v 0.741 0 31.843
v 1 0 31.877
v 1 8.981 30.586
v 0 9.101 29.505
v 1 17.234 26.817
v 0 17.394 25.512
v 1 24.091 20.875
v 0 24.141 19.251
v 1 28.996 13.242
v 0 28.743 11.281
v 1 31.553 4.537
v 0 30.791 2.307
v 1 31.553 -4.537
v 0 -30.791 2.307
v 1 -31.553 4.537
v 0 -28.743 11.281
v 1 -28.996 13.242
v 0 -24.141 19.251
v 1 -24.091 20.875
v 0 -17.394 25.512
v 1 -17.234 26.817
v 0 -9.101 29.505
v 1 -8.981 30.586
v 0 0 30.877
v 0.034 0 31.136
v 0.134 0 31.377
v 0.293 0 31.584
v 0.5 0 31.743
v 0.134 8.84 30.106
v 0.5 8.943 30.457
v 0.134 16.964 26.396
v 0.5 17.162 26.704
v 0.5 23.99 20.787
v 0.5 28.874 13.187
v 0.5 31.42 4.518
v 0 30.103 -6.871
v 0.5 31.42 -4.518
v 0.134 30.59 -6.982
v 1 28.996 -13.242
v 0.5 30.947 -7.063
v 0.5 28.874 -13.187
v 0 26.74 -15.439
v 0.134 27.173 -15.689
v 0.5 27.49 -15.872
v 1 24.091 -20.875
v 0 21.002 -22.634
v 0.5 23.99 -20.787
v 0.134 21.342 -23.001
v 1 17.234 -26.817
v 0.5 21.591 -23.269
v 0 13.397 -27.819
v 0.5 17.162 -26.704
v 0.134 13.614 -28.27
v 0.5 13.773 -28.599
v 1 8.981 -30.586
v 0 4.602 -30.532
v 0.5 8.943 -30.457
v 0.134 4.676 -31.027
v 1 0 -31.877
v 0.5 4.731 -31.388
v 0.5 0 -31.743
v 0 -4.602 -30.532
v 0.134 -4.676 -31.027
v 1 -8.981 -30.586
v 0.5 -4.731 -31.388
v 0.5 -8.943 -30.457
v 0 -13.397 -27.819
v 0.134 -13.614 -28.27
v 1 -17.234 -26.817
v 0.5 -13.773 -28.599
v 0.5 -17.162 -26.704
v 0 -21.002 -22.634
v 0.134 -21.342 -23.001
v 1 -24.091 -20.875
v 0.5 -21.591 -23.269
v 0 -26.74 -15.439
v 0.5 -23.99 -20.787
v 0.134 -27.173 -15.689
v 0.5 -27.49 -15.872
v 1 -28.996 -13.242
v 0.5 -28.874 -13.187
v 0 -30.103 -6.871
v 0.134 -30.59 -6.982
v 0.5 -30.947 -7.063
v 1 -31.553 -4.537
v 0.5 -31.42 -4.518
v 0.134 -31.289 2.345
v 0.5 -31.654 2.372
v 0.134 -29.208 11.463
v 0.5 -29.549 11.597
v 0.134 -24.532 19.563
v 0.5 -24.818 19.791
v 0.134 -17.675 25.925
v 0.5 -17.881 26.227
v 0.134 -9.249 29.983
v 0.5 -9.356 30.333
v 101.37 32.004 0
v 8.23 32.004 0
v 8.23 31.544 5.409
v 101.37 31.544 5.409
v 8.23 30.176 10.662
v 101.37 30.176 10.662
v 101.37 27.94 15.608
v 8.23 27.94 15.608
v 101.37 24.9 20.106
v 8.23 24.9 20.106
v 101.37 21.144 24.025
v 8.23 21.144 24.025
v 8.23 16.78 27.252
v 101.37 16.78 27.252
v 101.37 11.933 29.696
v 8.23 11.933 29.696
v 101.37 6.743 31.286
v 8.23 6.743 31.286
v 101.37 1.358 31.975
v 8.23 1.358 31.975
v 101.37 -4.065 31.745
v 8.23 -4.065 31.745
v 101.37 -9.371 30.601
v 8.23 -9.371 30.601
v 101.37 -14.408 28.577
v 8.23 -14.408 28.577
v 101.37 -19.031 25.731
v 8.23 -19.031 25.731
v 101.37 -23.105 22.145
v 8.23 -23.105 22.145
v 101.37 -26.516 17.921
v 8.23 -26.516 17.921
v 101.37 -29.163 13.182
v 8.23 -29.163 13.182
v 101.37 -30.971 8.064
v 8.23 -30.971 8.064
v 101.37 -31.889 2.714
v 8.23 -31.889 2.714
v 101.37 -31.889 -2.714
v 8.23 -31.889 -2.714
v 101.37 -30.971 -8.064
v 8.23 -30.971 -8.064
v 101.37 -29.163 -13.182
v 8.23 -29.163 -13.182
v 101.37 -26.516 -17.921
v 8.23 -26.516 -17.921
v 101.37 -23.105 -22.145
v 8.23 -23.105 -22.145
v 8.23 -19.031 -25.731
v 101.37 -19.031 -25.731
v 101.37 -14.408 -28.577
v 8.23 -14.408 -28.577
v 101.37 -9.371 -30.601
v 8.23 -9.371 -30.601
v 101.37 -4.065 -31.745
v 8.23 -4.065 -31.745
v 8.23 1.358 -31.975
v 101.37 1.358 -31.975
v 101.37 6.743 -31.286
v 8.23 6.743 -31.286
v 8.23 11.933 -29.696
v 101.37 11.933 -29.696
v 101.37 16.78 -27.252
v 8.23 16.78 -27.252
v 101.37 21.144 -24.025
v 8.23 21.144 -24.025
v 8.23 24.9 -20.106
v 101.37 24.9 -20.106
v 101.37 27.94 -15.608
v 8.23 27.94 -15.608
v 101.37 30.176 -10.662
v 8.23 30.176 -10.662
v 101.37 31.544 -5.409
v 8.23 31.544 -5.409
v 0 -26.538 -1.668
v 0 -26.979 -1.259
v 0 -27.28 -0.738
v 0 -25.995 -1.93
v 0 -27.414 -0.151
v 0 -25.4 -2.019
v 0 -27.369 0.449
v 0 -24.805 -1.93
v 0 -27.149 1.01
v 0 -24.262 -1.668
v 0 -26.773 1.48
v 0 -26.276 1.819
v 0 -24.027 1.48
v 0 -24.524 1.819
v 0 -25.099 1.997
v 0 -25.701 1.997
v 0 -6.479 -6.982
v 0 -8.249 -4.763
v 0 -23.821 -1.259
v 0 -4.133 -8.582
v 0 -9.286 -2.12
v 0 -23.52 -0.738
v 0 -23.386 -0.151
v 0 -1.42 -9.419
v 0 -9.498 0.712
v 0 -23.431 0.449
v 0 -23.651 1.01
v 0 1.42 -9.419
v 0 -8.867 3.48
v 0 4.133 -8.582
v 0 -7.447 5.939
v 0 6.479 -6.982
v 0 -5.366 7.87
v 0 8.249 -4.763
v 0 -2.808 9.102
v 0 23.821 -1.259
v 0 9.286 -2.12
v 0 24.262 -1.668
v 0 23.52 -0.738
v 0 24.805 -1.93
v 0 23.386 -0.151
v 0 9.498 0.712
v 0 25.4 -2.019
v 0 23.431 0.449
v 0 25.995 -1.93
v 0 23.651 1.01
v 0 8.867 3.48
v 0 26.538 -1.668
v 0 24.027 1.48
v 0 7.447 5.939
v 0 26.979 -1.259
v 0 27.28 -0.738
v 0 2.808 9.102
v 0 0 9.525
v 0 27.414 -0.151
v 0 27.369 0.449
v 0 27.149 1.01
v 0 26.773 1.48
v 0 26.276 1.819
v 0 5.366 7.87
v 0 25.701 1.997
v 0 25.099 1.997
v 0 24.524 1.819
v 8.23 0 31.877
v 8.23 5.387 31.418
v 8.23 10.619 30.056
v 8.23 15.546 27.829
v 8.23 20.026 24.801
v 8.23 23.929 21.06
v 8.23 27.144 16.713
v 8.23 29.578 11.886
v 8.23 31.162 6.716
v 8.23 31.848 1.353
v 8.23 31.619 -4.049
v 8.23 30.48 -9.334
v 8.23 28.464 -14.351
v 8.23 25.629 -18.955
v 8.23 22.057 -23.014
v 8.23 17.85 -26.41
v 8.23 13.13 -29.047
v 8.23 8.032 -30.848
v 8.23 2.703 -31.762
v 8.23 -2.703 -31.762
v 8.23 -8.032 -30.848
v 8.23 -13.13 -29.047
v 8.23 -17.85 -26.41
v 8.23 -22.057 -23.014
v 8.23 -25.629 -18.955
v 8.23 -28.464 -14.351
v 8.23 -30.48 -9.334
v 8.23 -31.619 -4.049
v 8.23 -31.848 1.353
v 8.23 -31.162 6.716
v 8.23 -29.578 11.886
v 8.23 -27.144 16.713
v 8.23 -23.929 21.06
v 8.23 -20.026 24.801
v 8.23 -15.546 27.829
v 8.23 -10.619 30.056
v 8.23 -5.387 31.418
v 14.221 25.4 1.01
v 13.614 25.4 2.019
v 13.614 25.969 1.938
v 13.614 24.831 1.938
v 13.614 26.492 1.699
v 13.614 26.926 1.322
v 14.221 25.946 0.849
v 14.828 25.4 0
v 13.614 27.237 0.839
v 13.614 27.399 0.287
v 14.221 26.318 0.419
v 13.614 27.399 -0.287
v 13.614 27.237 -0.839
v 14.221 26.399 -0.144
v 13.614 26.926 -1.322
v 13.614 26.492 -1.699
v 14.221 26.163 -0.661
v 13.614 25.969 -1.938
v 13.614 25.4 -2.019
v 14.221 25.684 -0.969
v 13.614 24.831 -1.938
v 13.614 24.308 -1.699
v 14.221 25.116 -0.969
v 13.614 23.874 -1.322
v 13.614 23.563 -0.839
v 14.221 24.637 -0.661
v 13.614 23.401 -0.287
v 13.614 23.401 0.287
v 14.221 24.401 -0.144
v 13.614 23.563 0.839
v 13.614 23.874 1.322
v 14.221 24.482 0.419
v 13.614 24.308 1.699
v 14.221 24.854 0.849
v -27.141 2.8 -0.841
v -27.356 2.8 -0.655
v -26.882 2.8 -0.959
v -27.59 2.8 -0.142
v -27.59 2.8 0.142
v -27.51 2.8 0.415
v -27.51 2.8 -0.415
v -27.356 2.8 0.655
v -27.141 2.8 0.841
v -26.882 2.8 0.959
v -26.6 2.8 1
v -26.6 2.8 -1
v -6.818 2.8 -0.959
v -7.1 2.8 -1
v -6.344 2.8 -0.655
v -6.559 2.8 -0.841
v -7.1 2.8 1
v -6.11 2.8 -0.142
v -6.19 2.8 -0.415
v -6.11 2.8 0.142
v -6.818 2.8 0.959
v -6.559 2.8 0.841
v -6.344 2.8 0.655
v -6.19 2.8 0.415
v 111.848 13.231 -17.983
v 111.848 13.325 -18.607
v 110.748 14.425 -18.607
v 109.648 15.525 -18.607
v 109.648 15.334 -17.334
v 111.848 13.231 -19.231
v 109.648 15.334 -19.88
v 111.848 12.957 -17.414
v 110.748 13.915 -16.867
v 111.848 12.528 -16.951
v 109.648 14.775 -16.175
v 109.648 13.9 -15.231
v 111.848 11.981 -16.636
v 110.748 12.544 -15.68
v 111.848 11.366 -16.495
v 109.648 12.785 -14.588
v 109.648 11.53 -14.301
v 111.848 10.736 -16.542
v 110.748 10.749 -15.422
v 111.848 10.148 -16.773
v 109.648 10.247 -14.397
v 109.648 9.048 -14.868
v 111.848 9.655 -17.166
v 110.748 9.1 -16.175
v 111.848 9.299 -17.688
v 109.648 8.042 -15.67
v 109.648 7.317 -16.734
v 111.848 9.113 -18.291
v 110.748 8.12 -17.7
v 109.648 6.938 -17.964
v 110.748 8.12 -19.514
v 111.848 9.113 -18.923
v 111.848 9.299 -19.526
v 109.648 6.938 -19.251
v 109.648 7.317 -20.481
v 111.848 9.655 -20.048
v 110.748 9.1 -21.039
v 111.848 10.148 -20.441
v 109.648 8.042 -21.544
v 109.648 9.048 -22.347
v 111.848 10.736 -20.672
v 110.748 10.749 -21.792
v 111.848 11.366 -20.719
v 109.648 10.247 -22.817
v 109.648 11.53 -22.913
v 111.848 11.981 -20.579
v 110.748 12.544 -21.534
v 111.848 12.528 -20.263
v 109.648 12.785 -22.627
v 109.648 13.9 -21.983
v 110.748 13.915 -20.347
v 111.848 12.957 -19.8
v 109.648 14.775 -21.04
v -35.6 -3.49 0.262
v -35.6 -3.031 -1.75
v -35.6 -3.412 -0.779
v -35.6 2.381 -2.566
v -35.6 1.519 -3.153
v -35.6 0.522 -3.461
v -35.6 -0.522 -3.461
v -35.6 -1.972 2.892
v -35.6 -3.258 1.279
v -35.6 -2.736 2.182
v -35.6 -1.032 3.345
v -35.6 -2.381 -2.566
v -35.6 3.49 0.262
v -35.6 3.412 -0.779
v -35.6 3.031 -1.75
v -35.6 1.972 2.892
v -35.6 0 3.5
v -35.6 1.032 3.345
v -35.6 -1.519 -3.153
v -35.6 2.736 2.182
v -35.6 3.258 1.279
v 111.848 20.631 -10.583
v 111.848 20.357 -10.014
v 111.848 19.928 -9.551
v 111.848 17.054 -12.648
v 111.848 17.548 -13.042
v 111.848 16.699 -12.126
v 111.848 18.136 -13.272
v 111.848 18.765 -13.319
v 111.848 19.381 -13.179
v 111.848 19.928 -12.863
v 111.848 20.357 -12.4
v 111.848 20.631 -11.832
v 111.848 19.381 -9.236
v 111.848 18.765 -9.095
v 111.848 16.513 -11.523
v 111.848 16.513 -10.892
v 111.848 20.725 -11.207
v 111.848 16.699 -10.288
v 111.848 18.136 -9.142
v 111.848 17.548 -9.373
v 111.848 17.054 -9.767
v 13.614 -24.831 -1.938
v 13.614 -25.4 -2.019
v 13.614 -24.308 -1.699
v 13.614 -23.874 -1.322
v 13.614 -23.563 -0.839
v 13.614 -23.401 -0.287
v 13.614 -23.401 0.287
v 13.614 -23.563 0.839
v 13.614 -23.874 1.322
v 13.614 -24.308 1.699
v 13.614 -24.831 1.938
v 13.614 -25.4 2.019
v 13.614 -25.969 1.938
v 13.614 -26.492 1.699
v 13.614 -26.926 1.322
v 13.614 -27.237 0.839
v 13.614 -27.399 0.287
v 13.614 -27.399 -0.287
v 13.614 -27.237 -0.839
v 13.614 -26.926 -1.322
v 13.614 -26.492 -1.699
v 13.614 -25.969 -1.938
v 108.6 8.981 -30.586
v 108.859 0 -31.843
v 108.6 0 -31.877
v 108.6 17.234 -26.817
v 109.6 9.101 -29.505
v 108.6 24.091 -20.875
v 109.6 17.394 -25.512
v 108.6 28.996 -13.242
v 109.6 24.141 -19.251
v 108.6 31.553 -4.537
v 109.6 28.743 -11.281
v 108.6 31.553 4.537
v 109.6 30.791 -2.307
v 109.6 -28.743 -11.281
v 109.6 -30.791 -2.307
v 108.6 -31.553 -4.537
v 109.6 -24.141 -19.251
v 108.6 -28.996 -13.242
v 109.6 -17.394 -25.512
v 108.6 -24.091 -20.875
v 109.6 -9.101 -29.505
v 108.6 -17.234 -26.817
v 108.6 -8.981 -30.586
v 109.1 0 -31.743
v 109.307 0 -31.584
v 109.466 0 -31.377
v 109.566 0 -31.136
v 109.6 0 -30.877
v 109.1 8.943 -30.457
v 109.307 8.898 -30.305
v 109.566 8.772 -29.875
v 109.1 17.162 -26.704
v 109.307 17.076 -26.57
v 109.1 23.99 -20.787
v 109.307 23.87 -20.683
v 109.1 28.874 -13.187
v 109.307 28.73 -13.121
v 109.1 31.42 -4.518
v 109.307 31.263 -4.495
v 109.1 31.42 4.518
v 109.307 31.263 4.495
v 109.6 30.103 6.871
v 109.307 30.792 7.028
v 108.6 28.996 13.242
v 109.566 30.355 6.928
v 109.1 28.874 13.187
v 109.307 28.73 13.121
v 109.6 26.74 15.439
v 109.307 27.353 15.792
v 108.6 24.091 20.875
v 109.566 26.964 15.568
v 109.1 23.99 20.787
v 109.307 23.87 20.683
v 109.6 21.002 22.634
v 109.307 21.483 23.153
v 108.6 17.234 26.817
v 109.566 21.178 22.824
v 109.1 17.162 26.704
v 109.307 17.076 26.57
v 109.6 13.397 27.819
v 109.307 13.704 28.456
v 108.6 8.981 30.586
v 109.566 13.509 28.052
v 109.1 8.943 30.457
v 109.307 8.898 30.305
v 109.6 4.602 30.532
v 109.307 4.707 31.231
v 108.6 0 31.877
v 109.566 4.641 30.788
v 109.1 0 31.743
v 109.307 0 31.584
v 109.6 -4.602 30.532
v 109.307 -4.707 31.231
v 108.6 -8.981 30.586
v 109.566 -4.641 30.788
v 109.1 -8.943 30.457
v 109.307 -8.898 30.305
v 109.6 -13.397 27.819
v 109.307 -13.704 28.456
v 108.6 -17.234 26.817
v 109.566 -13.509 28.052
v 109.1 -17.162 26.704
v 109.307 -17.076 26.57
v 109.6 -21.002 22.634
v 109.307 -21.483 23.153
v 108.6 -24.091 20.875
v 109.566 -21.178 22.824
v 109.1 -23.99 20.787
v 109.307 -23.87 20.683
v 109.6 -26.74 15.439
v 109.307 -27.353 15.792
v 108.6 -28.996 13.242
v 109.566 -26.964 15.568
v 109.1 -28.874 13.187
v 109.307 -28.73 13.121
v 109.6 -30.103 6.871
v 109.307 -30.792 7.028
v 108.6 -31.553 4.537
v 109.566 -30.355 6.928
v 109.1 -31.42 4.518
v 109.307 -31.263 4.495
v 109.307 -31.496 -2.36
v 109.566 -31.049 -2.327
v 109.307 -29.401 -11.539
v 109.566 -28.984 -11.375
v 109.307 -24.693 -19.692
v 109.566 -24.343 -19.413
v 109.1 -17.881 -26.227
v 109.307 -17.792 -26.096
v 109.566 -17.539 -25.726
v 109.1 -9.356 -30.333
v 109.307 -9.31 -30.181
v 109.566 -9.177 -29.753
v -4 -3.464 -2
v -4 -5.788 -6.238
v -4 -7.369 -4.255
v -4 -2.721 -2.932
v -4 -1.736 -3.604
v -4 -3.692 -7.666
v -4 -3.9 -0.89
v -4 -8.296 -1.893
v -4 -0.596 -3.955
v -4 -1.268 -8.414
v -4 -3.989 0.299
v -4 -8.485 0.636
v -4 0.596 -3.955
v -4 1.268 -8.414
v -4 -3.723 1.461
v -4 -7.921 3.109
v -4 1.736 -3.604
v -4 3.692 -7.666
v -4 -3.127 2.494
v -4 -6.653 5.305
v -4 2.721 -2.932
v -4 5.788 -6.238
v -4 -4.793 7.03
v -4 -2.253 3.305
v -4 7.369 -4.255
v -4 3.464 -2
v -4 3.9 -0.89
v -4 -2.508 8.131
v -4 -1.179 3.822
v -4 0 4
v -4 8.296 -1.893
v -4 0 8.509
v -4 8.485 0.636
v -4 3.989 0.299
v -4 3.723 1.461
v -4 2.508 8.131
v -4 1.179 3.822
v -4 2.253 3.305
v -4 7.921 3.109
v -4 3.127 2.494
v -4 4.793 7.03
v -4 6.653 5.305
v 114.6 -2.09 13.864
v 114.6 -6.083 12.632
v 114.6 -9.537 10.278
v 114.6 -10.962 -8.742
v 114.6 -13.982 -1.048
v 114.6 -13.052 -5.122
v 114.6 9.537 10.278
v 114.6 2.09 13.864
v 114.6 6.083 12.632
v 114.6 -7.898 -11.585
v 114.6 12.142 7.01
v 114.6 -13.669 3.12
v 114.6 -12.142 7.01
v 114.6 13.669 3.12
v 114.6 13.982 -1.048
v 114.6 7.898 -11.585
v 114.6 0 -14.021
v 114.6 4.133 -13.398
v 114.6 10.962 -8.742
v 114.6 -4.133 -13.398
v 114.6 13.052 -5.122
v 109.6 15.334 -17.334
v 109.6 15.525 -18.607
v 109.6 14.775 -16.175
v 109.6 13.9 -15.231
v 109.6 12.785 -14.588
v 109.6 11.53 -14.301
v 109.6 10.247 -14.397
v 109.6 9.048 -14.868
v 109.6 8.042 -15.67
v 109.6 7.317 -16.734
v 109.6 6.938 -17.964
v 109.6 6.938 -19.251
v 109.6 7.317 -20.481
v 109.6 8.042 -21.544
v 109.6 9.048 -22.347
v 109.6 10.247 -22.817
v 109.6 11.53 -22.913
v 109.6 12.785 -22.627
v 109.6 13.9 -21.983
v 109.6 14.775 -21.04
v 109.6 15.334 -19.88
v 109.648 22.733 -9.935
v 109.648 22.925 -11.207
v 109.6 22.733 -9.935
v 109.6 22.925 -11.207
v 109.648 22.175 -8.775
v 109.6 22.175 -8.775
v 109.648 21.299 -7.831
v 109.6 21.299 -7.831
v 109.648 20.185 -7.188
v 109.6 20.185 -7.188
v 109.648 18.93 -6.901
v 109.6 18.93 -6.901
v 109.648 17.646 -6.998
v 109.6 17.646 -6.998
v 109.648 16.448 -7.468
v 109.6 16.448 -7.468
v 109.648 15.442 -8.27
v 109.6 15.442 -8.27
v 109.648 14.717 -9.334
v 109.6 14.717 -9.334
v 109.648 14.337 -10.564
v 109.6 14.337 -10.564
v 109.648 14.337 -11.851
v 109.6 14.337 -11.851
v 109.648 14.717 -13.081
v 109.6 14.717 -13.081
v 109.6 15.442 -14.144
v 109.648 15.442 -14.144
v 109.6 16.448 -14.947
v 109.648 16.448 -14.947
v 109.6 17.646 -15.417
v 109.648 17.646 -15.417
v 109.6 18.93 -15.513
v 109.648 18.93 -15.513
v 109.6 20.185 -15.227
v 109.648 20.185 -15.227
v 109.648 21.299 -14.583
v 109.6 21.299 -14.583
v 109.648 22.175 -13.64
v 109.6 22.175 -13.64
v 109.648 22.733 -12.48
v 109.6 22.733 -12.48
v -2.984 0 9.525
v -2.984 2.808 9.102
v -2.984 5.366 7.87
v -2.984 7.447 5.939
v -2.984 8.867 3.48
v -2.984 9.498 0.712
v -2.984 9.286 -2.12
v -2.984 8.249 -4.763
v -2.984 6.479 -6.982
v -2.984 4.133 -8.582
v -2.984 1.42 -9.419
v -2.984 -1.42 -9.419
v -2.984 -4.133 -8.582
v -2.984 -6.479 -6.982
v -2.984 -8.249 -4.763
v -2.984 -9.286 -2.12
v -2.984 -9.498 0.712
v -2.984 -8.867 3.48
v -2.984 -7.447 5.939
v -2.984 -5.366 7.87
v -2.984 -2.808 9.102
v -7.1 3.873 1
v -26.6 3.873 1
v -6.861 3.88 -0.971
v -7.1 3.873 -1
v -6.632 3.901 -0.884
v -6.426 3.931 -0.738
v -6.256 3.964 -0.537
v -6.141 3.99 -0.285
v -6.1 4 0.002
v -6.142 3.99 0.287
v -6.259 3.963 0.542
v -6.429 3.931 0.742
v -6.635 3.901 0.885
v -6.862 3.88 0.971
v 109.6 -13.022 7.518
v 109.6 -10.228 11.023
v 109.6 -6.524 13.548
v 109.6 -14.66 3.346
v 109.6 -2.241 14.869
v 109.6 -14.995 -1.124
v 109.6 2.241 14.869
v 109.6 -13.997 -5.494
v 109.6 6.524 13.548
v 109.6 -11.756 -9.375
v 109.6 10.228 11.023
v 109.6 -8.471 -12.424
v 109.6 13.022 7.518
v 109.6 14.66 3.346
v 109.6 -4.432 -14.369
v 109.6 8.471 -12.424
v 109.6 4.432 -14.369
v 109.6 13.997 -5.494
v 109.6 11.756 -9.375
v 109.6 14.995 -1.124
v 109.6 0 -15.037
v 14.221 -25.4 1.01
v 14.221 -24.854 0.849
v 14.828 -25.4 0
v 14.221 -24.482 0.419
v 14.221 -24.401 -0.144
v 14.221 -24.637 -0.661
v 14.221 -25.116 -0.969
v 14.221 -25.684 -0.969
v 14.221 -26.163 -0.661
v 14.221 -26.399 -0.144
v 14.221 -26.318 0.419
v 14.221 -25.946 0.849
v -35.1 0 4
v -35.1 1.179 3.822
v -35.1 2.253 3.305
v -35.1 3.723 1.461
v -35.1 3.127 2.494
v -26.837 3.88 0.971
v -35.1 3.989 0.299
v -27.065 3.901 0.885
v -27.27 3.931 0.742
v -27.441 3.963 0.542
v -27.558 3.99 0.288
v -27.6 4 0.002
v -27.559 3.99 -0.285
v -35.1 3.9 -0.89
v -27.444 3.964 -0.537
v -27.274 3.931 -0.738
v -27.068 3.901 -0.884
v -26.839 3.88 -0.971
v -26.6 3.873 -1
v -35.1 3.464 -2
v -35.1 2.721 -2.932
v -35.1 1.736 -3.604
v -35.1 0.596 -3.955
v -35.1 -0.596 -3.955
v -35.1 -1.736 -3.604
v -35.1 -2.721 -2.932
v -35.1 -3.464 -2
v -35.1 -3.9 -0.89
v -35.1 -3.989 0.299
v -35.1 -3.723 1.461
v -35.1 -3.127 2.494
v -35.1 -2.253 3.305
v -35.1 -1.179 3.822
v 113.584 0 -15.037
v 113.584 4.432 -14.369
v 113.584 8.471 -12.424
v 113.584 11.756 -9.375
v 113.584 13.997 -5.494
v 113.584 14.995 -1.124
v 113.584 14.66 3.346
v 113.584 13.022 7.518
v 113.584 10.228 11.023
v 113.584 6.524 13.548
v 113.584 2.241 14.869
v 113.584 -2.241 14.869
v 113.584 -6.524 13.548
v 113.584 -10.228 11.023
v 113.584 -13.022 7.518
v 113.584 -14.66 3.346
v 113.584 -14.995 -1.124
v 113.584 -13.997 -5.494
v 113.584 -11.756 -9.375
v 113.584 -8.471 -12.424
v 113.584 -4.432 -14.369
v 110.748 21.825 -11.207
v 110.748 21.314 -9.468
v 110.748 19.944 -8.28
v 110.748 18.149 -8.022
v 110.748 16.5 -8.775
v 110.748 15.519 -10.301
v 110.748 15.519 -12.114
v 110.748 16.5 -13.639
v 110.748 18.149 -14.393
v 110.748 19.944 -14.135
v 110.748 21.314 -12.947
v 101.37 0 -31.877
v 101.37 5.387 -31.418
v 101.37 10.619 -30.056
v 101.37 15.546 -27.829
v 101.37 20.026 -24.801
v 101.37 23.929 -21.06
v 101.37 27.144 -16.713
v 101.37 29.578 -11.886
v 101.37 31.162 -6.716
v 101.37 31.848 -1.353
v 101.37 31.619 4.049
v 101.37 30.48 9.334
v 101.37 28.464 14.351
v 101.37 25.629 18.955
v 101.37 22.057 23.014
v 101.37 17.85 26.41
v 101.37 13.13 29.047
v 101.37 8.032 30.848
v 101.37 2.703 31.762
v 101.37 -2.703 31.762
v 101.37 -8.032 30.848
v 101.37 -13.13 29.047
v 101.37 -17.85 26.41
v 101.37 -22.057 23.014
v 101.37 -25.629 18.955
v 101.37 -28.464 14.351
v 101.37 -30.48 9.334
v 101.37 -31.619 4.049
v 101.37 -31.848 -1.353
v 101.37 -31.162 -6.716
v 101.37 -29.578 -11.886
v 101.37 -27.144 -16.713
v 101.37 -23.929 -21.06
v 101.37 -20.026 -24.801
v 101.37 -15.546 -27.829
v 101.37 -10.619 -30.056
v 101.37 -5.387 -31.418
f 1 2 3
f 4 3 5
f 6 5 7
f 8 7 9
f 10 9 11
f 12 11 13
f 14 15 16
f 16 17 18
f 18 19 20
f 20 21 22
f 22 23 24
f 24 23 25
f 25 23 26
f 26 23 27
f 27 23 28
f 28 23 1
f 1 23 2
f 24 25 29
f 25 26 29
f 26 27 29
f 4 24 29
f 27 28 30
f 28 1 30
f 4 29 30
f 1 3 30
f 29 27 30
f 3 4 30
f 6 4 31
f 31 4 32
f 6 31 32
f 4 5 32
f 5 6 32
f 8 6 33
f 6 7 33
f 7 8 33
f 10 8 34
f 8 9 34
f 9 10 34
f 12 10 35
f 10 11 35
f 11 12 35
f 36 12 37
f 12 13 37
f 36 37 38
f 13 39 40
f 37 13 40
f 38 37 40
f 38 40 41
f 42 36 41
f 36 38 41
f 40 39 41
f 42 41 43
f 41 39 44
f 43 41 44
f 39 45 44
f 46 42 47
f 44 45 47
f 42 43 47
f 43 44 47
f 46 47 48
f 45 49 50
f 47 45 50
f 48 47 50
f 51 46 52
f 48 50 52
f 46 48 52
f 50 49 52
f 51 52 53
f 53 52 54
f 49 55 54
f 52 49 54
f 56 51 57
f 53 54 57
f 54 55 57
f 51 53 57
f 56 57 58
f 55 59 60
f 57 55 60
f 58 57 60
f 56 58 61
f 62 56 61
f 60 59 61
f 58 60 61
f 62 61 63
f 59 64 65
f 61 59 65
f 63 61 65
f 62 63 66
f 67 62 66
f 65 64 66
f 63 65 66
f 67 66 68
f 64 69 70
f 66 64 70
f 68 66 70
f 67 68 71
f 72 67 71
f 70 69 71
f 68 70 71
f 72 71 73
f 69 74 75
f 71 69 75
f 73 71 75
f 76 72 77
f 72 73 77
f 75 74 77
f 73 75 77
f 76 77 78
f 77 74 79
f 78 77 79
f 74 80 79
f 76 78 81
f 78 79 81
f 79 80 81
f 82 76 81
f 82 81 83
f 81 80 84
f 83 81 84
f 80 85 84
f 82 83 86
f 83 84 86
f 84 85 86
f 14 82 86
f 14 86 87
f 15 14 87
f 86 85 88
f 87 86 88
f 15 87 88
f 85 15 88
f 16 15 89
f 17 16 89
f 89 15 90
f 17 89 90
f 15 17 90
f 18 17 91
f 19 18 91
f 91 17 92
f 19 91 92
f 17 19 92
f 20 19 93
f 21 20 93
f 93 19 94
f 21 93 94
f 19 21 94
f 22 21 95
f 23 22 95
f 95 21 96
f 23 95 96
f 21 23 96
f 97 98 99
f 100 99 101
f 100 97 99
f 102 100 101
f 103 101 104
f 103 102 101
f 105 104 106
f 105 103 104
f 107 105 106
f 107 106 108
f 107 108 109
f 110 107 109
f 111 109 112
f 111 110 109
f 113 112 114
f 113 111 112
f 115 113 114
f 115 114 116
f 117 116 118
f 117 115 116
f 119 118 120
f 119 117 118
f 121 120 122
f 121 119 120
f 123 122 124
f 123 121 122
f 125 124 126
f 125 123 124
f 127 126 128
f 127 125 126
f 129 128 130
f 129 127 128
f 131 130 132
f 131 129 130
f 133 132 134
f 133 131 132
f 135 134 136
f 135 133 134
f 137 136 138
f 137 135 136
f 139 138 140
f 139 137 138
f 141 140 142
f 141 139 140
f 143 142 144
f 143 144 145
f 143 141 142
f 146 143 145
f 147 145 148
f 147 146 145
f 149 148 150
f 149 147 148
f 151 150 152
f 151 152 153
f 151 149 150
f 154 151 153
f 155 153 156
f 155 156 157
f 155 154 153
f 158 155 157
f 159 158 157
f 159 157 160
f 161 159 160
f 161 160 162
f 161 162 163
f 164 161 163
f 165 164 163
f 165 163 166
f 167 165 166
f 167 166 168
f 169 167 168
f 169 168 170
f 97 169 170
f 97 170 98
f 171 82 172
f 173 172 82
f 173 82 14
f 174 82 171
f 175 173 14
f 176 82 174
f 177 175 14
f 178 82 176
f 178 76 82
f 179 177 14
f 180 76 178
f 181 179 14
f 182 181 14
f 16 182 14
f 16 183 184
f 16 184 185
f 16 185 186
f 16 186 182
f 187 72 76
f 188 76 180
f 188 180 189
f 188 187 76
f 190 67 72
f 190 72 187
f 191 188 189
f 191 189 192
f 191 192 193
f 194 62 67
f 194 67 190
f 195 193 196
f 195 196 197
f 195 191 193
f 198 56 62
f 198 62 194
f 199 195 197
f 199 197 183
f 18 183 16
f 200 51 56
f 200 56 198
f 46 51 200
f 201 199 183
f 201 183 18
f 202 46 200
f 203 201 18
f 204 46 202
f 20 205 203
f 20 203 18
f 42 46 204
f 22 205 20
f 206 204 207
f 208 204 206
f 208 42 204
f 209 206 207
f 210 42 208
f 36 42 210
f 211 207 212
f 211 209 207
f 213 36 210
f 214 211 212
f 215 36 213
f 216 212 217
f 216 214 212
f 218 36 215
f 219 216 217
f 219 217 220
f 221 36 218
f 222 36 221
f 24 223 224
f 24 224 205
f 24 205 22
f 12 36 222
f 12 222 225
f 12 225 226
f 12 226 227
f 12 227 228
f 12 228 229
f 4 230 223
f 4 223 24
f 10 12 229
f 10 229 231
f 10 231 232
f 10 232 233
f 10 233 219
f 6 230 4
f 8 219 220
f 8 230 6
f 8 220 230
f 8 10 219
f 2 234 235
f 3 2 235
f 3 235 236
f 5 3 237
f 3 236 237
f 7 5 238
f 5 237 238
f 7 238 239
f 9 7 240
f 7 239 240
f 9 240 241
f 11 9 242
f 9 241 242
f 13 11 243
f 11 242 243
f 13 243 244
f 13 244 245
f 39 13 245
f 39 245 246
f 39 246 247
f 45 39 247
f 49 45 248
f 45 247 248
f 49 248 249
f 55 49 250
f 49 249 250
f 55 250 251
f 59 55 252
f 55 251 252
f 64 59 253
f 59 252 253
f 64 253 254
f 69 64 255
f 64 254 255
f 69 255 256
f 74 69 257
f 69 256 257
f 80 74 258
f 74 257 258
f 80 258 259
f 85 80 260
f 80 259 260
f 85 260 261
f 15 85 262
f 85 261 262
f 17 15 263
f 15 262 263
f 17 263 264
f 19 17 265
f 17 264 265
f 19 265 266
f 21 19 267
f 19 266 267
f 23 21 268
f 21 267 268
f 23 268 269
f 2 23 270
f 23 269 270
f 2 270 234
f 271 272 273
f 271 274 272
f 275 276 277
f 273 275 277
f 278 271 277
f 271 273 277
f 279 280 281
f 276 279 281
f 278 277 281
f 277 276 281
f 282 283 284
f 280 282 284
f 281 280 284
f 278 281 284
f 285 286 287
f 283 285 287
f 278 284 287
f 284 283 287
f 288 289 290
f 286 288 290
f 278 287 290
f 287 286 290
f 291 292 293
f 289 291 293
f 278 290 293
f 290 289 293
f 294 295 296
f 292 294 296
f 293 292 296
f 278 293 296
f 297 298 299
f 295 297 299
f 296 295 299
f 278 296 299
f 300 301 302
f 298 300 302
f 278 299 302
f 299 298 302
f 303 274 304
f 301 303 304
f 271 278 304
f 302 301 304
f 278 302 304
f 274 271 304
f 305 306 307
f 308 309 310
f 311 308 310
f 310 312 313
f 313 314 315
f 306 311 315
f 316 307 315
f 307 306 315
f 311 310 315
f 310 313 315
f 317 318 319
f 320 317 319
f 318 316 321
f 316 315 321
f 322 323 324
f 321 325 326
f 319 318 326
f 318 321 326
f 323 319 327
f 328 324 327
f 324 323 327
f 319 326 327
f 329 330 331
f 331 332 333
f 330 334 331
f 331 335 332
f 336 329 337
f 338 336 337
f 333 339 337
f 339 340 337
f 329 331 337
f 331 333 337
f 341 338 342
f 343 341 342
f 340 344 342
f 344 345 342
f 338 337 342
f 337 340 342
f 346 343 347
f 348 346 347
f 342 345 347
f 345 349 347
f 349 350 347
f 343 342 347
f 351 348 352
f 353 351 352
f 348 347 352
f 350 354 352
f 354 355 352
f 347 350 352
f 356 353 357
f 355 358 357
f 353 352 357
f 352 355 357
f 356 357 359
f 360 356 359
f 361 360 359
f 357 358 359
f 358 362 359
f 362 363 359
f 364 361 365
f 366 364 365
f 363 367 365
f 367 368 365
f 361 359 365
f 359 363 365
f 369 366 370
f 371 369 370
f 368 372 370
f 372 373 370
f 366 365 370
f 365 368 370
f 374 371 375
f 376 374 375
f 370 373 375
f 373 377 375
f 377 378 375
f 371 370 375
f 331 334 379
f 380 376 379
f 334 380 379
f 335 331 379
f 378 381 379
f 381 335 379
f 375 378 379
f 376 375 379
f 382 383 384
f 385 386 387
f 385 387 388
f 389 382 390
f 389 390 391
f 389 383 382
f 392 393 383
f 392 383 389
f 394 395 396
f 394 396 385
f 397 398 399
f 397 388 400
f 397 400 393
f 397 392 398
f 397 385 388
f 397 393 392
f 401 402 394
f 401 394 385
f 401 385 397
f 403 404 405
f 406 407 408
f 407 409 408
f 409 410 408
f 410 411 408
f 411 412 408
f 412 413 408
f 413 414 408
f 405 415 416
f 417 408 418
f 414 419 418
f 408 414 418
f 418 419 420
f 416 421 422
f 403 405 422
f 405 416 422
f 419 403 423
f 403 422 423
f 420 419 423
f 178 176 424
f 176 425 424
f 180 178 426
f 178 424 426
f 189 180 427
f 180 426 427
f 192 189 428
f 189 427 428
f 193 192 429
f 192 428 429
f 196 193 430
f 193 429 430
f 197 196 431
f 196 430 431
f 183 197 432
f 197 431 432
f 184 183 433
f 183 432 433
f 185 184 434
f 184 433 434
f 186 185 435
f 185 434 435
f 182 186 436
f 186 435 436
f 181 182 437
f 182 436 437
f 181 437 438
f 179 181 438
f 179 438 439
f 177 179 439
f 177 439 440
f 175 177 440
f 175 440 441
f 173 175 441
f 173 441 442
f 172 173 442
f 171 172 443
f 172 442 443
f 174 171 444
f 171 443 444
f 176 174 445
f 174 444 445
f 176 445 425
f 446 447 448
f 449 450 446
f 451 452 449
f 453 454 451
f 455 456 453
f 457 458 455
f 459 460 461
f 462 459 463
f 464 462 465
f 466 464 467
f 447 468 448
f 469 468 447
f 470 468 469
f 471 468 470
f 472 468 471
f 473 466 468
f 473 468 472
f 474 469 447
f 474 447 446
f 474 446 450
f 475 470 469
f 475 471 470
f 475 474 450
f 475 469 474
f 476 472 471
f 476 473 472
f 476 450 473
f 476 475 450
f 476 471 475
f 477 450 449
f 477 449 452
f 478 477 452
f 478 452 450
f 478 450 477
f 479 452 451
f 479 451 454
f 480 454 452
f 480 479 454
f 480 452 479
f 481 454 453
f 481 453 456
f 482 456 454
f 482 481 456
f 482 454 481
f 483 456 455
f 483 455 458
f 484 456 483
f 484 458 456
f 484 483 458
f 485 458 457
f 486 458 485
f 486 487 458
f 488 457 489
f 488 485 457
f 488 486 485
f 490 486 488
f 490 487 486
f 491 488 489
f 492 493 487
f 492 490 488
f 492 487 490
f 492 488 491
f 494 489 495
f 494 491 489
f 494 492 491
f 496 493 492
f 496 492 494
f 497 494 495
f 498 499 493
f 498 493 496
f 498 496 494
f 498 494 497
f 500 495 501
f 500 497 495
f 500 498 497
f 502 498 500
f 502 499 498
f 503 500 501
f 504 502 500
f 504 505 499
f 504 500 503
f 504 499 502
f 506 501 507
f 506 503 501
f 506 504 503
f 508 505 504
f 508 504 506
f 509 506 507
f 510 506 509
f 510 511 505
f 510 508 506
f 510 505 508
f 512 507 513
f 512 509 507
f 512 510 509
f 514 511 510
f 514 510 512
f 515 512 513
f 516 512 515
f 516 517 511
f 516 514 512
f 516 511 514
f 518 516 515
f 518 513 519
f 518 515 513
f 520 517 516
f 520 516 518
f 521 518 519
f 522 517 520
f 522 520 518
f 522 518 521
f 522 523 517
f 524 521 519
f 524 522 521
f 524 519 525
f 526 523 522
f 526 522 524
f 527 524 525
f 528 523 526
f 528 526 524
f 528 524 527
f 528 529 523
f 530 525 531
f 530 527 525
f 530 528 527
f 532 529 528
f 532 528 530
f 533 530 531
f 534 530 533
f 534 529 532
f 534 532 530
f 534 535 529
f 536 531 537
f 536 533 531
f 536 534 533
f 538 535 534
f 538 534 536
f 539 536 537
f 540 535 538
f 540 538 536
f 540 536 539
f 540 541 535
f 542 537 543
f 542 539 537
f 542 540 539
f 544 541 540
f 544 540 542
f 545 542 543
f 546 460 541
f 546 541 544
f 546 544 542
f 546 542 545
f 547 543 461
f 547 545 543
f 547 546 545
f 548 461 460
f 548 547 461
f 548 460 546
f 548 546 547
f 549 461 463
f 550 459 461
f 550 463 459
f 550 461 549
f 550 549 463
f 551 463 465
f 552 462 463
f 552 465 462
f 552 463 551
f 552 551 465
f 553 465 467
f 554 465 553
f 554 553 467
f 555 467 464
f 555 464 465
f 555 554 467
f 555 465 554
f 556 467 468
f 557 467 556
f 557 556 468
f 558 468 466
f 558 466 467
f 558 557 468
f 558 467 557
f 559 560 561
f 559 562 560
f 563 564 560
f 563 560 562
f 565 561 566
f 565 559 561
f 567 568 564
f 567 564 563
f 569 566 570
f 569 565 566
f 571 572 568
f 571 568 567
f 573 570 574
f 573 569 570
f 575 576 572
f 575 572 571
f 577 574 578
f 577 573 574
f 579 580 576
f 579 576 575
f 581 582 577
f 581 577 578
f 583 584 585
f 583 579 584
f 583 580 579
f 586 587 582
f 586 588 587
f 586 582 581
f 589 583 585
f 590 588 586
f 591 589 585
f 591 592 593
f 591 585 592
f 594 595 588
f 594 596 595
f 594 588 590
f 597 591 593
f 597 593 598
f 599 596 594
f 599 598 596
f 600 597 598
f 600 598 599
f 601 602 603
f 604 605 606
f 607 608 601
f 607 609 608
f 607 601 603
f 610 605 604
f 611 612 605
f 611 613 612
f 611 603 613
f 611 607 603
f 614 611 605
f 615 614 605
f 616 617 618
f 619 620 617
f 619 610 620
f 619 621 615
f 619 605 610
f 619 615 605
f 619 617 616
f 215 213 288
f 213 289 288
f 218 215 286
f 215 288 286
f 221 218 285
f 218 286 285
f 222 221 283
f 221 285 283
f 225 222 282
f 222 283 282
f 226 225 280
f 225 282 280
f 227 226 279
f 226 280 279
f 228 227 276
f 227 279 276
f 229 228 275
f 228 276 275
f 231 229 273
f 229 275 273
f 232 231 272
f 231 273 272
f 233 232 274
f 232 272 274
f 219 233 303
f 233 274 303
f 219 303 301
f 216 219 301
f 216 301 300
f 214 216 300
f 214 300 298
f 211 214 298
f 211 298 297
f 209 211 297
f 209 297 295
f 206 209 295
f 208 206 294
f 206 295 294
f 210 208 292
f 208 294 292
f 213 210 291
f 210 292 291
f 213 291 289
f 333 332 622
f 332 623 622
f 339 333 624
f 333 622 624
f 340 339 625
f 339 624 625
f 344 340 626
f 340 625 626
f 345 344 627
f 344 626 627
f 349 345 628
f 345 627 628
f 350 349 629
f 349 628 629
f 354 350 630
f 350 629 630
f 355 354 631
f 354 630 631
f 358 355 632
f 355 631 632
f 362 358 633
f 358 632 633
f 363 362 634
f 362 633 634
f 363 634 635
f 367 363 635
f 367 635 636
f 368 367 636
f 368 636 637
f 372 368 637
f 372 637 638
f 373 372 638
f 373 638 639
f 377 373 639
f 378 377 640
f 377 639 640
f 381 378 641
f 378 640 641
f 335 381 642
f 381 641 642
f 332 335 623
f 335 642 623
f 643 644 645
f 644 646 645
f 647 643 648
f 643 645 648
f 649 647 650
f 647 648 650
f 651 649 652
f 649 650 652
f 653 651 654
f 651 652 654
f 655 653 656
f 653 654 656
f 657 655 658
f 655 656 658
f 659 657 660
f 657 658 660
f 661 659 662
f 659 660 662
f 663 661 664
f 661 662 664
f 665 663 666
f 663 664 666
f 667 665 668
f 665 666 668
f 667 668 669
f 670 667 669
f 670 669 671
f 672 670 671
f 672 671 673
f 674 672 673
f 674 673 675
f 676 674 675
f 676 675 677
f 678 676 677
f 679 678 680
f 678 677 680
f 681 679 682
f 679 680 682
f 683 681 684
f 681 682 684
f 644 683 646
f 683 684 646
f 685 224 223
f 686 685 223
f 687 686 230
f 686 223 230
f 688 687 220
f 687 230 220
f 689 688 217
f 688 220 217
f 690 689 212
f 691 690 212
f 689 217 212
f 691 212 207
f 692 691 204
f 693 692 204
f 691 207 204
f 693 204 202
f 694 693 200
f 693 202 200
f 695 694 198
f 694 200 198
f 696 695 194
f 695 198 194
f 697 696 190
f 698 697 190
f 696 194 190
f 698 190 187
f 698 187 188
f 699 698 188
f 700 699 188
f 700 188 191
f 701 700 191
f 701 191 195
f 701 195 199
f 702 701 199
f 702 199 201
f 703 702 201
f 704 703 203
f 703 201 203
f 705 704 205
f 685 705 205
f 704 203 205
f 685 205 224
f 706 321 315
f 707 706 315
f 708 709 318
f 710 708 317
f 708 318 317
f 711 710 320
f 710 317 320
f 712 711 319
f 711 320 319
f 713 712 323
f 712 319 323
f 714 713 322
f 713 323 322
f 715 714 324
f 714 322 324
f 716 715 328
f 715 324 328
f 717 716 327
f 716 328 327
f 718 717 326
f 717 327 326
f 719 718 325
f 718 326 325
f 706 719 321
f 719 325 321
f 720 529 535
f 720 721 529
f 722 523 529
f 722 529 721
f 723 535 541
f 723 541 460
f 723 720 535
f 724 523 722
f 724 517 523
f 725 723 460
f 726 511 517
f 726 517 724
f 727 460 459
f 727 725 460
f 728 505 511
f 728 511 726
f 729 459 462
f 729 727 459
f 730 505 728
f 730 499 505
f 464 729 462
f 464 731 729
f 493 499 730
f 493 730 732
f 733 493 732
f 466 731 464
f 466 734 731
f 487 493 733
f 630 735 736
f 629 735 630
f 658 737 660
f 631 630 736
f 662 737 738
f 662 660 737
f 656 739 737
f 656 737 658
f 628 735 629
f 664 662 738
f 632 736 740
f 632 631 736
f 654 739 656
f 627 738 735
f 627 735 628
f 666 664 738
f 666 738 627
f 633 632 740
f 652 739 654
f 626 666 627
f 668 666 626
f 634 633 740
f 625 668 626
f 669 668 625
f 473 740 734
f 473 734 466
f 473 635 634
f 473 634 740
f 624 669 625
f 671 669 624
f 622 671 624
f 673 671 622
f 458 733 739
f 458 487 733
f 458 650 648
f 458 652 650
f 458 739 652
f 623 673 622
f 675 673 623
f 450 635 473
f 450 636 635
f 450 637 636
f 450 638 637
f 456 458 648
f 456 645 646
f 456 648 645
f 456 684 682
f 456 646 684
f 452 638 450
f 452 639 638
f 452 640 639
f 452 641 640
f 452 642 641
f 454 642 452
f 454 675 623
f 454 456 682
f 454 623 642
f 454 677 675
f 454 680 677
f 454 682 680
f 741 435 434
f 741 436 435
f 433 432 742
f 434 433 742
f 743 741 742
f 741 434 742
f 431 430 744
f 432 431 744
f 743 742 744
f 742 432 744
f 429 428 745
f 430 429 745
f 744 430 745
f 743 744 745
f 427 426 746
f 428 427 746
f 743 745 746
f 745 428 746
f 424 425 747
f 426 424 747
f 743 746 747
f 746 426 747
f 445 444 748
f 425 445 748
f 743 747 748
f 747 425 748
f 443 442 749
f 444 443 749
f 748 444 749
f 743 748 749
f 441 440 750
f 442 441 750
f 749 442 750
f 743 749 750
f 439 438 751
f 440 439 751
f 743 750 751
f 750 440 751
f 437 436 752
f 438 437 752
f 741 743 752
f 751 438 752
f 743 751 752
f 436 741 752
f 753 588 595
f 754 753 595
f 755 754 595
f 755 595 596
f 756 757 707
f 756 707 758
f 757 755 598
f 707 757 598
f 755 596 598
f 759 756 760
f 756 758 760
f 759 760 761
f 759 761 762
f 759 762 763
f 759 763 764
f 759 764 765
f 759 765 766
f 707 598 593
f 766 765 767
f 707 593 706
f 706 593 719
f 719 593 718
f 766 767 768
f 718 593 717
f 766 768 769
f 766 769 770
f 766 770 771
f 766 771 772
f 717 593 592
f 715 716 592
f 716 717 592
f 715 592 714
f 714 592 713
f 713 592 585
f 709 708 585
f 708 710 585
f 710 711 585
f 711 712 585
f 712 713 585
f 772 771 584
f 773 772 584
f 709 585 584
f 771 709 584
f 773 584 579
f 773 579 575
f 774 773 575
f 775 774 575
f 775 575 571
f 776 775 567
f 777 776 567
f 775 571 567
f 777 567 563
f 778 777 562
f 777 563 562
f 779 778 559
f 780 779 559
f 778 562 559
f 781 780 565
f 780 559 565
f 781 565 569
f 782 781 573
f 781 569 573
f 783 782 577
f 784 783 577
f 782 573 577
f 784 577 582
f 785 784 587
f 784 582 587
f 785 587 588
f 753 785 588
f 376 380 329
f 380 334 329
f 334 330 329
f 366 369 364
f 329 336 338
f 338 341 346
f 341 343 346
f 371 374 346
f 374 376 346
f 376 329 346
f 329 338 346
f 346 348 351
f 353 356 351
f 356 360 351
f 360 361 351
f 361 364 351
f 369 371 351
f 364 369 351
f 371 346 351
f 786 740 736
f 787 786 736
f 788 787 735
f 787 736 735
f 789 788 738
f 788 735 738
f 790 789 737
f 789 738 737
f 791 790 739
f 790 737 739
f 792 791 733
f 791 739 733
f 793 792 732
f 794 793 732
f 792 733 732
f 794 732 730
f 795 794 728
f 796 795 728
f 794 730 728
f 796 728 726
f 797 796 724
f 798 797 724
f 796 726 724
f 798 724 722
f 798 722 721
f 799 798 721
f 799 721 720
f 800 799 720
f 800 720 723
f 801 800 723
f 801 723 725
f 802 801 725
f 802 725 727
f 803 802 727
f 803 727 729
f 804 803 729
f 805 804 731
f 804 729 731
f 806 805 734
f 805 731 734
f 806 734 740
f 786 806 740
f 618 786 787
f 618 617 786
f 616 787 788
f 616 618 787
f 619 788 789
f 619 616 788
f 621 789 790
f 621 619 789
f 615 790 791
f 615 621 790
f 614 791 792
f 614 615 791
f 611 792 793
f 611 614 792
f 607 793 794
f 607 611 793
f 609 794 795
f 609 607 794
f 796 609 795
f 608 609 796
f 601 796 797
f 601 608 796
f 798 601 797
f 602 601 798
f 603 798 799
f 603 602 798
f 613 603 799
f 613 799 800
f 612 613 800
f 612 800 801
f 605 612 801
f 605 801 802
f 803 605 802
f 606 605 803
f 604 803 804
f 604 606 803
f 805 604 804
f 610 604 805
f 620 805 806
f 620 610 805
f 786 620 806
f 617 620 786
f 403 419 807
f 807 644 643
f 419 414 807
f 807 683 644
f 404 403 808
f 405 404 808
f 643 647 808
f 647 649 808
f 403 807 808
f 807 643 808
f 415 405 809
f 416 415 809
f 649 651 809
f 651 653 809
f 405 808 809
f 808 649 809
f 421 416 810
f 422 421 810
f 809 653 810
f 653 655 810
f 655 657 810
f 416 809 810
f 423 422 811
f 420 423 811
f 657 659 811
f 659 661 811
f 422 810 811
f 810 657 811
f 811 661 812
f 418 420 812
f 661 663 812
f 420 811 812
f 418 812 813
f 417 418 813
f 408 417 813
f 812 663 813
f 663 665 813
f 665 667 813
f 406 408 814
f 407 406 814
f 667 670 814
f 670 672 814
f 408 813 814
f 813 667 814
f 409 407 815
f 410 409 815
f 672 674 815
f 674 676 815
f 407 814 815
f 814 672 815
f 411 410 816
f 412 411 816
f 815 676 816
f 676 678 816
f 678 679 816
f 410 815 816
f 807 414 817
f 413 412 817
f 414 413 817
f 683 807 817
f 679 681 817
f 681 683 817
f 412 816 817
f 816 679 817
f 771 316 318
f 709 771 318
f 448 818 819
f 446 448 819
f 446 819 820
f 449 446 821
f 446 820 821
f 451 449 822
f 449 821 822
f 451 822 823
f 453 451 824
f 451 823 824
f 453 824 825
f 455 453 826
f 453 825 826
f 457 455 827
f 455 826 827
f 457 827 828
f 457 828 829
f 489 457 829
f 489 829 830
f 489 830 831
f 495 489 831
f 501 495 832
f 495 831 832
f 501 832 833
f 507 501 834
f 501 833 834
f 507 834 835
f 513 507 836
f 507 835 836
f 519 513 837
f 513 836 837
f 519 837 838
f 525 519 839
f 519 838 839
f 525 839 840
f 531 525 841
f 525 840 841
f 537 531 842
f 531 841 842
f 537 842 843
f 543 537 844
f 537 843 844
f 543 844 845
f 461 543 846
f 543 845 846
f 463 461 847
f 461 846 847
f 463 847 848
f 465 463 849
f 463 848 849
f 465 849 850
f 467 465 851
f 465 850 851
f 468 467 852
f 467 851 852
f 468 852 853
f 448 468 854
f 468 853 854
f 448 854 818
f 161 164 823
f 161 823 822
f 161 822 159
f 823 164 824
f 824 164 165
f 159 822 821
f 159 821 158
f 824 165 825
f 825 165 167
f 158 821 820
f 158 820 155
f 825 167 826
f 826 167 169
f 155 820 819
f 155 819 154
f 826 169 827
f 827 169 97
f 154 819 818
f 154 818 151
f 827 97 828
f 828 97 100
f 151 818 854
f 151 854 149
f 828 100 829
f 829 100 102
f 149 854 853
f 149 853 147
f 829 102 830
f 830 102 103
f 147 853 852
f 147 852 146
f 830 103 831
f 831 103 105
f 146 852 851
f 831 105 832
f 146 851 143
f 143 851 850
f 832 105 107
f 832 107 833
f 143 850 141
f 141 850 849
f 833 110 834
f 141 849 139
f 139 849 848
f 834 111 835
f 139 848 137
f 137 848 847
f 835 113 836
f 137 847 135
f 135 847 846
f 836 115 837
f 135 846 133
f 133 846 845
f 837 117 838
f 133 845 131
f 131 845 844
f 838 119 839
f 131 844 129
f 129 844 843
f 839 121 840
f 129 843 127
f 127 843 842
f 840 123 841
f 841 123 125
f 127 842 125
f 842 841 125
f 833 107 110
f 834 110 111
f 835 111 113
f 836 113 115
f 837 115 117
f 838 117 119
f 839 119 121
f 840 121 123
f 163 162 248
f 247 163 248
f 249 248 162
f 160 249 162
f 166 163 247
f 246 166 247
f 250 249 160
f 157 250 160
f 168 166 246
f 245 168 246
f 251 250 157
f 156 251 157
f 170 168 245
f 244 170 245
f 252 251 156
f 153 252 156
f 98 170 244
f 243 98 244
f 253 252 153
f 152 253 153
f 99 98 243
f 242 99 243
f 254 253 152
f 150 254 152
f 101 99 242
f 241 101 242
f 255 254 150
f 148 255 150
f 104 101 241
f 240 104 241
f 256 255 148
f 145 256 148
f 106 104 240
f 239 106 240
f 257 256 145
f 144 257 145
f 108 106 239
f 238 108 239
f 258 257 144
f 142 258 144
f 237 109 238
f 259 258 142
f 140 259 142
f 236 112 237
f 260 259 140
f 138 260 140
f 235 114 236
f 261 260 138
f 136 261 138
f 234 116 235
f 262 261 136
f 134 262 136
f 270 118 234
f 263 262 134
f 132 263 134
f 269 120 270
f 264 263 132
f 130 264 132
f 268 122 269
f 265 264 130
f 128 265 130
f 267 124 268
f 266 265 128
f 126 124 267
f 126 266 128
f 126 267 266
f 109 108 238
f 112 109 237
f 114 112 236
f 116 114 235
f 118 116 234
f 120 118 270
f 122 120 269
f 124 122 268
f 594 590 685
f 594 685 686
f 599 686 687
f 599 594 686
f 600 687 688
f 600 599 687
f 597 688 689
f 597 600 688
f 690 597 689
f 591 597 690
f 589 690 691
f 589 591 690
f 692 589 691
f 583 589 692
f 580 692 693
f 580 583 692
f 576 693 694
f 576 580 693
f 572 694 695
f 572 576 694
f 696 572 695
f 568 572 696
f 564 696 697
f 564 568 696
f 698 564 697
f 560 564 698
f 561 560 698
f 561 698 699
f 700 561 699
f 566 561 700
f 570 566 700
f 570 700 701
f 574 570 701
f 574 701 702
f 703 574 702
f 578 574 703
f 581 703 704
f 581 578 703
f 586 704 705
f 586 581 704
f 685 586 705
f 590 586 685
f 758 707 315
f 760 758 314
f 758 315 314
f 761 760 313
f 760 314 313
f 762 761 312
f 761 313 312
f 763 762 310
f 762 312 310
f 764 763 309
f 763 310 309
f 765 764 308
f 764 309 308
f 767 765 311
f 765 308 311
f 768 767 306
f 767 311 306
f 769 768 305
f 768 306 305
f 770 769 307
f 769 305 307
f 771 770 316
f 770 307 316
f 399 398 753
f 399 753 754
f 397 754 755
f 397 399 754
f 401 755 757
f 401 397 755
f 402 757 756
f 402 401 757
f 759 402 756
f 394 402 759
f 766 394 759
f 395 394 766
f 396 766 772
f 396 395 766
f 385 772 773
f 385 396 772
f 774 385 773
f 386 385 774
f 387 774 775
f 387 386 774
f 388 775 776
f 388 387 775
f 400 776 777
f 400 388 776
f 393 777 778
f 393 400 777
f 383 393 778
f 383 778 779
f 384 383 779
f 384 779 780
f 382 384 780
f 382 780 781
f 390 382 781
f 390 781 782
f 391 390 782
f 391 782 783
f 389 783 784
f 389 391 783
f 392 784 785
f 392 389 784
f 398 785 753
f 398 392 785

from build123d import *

# Parameters (mm, degrees)
SKETCH1_W                       = 93.1408
SKETCH1_H                       = 32.004
SKETCH2_R                       = 31.877
BOSS_EXTRUDE1_DEPTH             = 8.2296
SKETCH3_R                       = 15.0368
BOSS_EXTRUDE2_DEPTH             = 3.984
SKETCH4_R                       = 15.0368
BOSS_EXTRUDE3_DEPTH             = 1.016
BOSS_EXTRUDE3_TAPER             = 45
SKETCH5_R                       = 31.877
BOSS_EXTRUDE4_DEPTH             = 8.2296
SKETCH6_R                       = 9.525
BOSS_EXTRUDE5_DEPTH             = 4
SKETCH7_R                       = 4
BOSS_EXTRUDE6_DEPTH             = 31.6
CUT_EXTRUDE1_REACH              = 31.204
F_21_0_159_DIAMETER_HOLE1_D     = 4.0386
F_21_0_159_DIAMETER_HOLE1_DEPTH = 13.6144
F_21_0_159_DIAMETER_HOLE1_TIP   = 1.213317848
CHAMFER1_SIZE                   = 1.016
CHAMFER2_SIZE                   = 0.5
FILLET1_R                       = 1


with BuildPart() as part:
    # Sketch1 → Revolve1 (revolve)
    with BuildSketch(Plane.XY):
        with Locations((54.8, 16.002)):
            Rectangle(SKETCH1_W, SKETCH1_H)
    revolve(axis=Axis((8.2296, 0, 0), (1, 0, 0)))

    # Sketch2 → Boss-Extrude1 (add)
    with BuildSketch(Plane(origin=(101.3704, 0, 0), x_dir=(0, 0, -1), z_dir=(1, 0, 0))):
        Circle(SKETCH2_R)
    extrude(amount=BOSS_EXTRUDE1_DEPTH)

    # Sketch3 → Boss-Extrude2 (add)
    with BuildSketch(Plane(origin=(109.6, 0, 0), x_dir=(0, 0, -1), z_dir=(1, 0, 0))):
        Circle(SKETCH3_R)
    extrude(amount=BOSS_EXTRUDE2_DEPTH)

    # Sketch4 → Boss-Extrude3 (add)
    with BuildSketch(Plane(origin=(113.584, 0, 0), x_dir=(0, 0, -1), z_dir=(1, 0, 0))):
        Circle(SKETCH4_R)
    extrude(amount=BOSS_EXTRUDE3_DEPTH, taper=BOSS_EXTRUDE3_TAPER)

    # Sketch5 → Boss-Extrude4 (add)
    with BuildSketch(Plane.ZY.offset(-8.2296)):
        Circle(SKETCH5_R)
    extrude(amount=BOSS_EXTRUDE4_DEPTH)

    # Sketch6 → Boss-Extrude5 (add)
    with BuildSketch(Plane.ZY):
        Circle(SKETCH6_R)
    extrude(amount=BOSS_EXTRUDE5_DEPTH)

    # Sketch7 → Boss-Extrude6 (add)
    with BuildSketch(Plane.ZY.offset(4)):
        Circle(SKETCH7_R)
    extrude(amount=BOSS_EXTRUDE6_DEPTH)

    # Sketch8 → Cut-Extrude1 (cut, up to next)
    with BuildSketch(Plane.XZ.offset(-2.8), mode=Mode.PRIVATE) as cut_extrude1_sk1:
        with BuildLine():
            Line((-7.1, 1), (-26.6, 1))
            ThreePointArc((-26.6, 1), (-27.6, 0), (-26.6, -1))
            Line((-26.6, -1), (-7.1, -1))
            ThreePointArc((-7.1, -1), (-6.1, 0), (-7.1, 1))
        make_face()
    cut_extrude1_tool1 = extrude(cut_extrude1_sk1.sketch, amount=-CUT_EXTRUDE1_REACH, mode=Mode.PRIVATE) & part.part
    add(cut_extrude1_tool1.solids().sort_by_distance((-16.85, 2.8, 0))[0], mode=Mode.SUBTRACT)

    # Sketch9 → Revolve2 (revolve)
    with BuildSketch(Plane.XY.offset(-18.607090683)):
        Polygon((109.6, 15.525359639), (109.6, 11.207359639), (111.8479, 11.207359639), (111.8479, 13.325359639), (109.6479, 15.525359639), align=None)
    revolve(axis=Axis((109.6, 11.207359639, -18.607090683), (1, 0, 0)))

    # Sketch10 → Revolve3 (revolve)
    with BuildSketch(Plane.XY.offset(-11.207359639)):
        Polygon((109.6, 22.925090683), (109.6, 18.607090683), (111.8479, 18.607090683), (111.8479, 20.725090683), (109.6479, 22.925090683), align=None)
    revolve(axis=Axis((109.6, 18.607090683, -11.207359639), (1, 0, 0)))

    # #21 (0.159) Diameter Hole1
    with Locations(Plane.ZY):
        with Locations((0, 25.4), (0, -25.4)):
            Hole(F_21_0_159_DIAMETER_HOLE1_D / 2, depth=F_21_0_159_DIAMETER_HOLE1_DEPTH)
            with Locations((0, 0, -(F_21_0_159_DIAMETER_HOLE1_DEPTH + F_21_0_159_DIAMETER_HOLE1_TIP / 2))):  # 118° drill point
                Cone(0, F_21_0_159_DIAMETER_HOLE1_D / 2, F_21_0_159_DIAMETER_HOLE1_TIP, mode=Mode.SUBTRACT)

    # Chamfer1
    chamfer1_edges = [part.edges().sort_by_distance(p)[0] for p in [
        (-4, 0, -9.525),
    ]]
    chamfer(chamfer1_edges, length=CHAMFER1_SIZE)

    # Chamfer2
    chamfer2_edges = [part.edges().sort_by_distance(p)[0] for p in [
        (-35.6, 0, -4),
    ]]
    chamfer(chamfer2_edges, length=CHAMFER2_SIZE)

    # Fillet1
    fillet1_edges = [part.edges().sort_by_distance(p)[0] for p in [
        (0, 0, -31.877),
        (109.6, 0, 31.877),
    ]]
    fillet(fillet1_edges, radius=FILLET1_R)


solid = part.part
